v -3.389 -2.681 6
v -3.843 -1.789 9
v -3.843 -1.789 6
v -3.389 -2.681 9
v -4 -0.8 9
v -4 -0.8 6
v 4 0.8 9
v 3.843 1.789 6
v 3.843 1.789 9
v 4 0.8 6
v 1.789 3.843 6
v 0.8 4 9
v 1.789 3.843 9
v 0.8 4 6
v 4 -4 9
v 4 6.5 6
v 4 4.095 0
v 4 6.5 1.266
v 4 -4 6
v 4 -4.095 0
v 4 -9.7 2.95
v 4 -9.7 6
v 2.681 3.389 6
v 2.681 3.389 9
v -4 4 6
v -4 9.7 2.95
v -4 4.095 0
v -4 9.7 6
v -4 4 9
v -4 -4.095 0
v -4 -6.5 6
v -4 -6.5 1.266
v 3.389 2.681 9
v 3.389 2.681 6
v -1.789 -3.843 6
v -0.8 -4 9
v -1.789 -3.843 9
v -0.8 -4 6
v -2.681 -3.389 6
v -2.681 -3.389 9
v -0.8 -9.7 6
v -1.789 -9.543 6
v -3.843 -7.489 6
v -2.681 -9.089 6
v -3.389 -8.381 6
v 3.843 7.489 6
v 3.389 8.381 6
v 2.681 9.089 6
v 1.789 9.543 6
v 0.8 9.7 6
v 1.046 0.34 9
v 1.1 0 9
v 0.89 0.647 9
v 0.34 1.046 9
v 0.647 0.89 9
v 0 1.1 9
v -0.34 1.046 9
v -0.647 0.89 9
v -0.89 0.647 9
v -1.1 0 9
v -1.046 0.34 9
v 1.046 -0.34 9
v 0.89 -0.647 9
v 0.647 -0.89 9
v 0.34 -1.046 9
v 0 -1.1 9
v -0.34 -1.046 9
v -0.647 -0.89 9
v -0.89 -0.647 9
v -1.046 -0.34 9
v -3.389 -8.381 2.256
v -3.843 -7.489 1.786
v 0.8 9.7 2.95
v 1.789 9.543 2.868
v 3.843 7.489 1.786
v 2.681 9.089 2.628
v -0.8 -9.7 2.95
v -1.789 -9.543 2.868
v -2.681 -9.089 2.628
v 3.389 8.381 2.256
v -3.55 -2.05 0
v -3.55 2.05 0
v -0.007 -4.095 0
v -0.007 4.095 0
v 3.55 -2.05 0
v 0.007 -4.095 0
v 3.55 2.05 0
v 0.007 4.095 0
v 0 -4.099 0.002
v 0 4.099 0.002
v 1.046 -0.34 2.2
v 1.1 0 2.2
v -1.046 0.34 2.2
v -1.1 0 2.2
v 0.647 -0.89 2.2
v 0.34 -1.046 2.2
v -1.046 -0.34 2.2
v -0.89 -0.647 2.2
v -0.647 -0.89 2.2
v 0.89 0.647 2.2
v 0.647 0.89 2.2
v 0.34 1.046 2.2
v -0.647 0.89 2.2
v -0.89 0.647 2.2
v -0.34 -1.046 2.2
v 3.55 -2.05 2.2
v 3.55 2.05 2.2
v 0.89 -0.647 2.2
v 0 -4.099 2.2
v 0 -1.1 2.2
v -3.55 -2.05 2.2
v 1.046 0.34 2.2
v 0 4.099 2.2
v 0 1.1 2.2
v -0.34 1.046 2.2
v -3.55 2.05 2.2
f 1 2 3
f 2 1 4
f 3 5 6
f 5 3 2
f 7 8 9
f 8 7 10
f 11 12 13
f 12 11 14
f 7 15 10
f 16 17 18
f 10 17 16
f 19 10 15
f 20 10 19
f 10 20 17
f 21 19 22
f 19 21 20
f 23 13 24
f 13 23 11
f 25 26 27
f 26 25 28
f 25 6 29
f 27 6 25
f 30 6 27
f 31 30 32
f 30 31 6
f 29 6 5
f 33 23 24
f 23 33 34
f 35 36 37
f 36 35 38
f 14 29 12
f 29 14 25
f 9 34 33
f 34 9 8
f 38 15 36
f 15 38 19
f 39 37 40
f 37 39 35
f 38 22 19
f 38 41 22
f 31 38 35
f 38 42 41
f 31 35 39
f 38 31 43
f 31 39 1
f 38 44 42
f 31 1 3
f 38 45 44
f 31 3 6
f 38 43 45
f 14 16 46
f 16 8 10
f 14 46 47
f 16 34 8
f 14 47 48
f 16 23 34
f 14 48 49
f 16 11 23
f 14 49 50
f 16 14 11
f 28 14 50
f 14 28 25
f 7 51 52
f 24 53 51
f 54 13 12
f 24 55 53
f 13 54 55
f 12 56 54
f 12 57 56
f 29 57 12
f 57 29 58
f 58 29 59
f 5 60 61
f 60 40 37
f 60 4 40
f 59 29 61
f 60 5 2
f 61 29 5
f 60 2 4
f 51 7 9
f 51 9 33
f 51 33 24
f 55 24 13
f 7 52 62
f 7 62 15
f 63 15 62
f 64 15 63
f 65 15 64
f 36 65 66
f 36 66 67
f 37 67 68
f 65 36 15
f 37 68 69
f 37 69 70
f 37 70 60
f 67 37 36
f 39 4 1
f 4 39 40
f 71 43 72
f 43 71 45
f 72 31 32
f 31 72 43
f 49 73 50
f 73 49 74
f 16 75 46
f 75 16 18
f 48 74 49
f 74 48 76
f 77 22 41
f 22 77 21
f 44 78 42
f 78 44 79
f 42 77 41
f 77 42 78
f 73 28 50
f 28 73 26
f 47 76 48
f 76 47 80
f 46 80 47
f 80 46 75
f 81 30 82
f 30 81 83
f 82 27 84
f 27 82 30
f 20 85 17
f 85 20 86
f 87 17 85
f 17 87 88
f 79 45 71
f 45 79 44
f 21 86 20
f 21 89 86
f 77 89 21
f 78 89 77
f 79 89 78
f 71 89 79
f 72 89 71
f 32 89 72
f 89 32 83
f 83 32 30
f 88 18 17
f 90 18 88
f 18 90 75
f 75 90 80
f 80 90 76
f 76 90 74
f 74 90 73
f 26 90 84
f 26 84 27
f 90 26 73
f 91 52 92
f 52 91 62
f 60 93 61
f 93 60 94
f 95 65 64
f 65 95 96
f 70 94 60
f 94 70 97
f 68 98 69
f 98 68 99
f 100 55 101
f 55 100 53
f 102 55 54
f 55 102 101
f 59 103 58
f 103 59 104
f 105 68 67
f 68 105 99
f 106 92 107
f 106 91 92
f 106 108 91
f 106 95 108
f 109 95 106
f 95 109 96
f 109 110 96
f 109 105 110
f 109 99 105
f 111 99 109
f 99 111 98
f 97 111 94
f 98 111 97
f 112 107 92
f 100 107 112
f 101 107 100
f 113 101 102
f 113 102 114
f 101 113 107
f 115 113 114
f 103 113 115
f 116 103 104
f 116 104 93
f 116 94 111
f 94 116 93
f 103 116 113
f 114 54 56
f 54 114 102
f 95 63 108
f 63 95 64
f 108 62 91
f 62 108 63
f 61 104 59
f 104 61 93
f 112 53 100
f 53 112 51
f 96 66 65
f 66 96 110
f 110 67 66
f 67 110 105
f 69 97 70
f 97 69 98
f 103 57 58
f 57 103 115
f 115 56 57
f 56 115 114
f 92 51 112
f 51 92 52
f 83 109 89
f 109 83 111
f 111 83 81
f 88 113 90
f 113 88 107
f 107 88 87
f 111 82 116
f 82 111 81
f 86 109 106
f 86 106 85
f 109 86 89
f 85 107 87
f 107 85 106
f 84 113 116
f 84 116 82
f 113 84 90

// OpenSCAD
/*
 <-----   A  ------>
         
     E |-----|             
 |-----|  F  |------|      ^
D|                  |      B
  \________________/       v
          C

W - Width (thickness)

*/

/*

Reference Dimensions

Extrusion
        A       B       C       D       E       F       W
2020    10.5    3.5     6.2     1       1       5       6
3030    15.6    5       8.2     2       1       6       6                                      
4040    19.4    6       8       3       3       8       8

Hex Nut
        Hole    Size    Height
M3      3.4     5.6     2.5
M4      4.6     7.1     3

Square Nut (DIN562)
        Hole    Size    Height
M3      3.4     5.6     1.8
M4      4.6     7.1     2.2

*/

// TNut(A, B, C, D, E, F, W, NutHole, NutSize, NutHeight, SquareNut);
// Example 4040 + M4 Hex
TNut(19.4, 6, 8, 3, 3, 8, 8, 4.6, 7.1, 2.2, false);

module TNut(A, B, C, D, E, F, W, NH, NS, NH, SquareNut=false){
    difference(){
        tee(A, B, C, D, E, F, W);
        nutAndHole(B+E, NH, NS, NH, SquareNut);
    }
}

module tee(A, B, C, D, E, F, W){
    translate([-W/2, -A/2, 0]){
        difference(){
            union(){
                translate([0, A/2-F/2, B]){
                    linear_extrude(height=E)
                        teeBodyShape(W, F);
                }            
                translate([0,0,0]){
                    linear_extrude(height=B)
                        teeBodyShape(W, A);
                }
            }
       
            translate([-0.5,0,B-D-0.05])
                rotate([0, 90, 0])
                    bottomCut(A, B, C, D, W);
        }
    }
}

module nutAndHole(t_height, t_holeDia, size, height, squarenut=false){
    union(){
        translate([0,0,height]){
            hole(t_holeDia, t_height);
        }
        #translate([0,0,0]){
            if (squarenut){
                square_nut(size, height);
            }else{
                hex_nut(size, height);
            }
        }
    }
}

module bottomCut(A, B, C, D, W){
    linear_extrude(height=W+1)
    polygon([
        [0,0],
        [B-D, (A-C)/2],
        [B-D, 0]
    ]);
    linear_extrude(height=W+1)
    polygon([
        [0,A],
        [B-D, A-(A-C)/2],
        [B-D, A]
    ]);
}

module teeBodyShape(width, length){
    filet = width/2.5;
    translate([filet, filet, 0]){
        circle(filet, $fn=20);
    }
    translate([width-filet, length-filet,0]){
        circle(filet, $fn=20);
    }
    polygon([
        [0, filet],
        [filet, filet],
        [filet, 0],
        [width, 0],
        [width, filet],
        [width, length-filet],
        [width-filet, length-filet],
        [width-filet, length],
        [0, length]
    ]);
}

module hole(dia, height){
    linear_extrude(height=height)
        circle(dia/2, $fn=20);
}

module square_nut(size, height){
    //rotate([0,0,45])
    linear_extrude(height=height)
        square([size, size], center=true);
}

module hex_nut(size, height){
    l = (size/2) / cos(30);
    rotate([0,0,90])
        linear_extrude(height=height)
            circle(l, $fn=6);
}
